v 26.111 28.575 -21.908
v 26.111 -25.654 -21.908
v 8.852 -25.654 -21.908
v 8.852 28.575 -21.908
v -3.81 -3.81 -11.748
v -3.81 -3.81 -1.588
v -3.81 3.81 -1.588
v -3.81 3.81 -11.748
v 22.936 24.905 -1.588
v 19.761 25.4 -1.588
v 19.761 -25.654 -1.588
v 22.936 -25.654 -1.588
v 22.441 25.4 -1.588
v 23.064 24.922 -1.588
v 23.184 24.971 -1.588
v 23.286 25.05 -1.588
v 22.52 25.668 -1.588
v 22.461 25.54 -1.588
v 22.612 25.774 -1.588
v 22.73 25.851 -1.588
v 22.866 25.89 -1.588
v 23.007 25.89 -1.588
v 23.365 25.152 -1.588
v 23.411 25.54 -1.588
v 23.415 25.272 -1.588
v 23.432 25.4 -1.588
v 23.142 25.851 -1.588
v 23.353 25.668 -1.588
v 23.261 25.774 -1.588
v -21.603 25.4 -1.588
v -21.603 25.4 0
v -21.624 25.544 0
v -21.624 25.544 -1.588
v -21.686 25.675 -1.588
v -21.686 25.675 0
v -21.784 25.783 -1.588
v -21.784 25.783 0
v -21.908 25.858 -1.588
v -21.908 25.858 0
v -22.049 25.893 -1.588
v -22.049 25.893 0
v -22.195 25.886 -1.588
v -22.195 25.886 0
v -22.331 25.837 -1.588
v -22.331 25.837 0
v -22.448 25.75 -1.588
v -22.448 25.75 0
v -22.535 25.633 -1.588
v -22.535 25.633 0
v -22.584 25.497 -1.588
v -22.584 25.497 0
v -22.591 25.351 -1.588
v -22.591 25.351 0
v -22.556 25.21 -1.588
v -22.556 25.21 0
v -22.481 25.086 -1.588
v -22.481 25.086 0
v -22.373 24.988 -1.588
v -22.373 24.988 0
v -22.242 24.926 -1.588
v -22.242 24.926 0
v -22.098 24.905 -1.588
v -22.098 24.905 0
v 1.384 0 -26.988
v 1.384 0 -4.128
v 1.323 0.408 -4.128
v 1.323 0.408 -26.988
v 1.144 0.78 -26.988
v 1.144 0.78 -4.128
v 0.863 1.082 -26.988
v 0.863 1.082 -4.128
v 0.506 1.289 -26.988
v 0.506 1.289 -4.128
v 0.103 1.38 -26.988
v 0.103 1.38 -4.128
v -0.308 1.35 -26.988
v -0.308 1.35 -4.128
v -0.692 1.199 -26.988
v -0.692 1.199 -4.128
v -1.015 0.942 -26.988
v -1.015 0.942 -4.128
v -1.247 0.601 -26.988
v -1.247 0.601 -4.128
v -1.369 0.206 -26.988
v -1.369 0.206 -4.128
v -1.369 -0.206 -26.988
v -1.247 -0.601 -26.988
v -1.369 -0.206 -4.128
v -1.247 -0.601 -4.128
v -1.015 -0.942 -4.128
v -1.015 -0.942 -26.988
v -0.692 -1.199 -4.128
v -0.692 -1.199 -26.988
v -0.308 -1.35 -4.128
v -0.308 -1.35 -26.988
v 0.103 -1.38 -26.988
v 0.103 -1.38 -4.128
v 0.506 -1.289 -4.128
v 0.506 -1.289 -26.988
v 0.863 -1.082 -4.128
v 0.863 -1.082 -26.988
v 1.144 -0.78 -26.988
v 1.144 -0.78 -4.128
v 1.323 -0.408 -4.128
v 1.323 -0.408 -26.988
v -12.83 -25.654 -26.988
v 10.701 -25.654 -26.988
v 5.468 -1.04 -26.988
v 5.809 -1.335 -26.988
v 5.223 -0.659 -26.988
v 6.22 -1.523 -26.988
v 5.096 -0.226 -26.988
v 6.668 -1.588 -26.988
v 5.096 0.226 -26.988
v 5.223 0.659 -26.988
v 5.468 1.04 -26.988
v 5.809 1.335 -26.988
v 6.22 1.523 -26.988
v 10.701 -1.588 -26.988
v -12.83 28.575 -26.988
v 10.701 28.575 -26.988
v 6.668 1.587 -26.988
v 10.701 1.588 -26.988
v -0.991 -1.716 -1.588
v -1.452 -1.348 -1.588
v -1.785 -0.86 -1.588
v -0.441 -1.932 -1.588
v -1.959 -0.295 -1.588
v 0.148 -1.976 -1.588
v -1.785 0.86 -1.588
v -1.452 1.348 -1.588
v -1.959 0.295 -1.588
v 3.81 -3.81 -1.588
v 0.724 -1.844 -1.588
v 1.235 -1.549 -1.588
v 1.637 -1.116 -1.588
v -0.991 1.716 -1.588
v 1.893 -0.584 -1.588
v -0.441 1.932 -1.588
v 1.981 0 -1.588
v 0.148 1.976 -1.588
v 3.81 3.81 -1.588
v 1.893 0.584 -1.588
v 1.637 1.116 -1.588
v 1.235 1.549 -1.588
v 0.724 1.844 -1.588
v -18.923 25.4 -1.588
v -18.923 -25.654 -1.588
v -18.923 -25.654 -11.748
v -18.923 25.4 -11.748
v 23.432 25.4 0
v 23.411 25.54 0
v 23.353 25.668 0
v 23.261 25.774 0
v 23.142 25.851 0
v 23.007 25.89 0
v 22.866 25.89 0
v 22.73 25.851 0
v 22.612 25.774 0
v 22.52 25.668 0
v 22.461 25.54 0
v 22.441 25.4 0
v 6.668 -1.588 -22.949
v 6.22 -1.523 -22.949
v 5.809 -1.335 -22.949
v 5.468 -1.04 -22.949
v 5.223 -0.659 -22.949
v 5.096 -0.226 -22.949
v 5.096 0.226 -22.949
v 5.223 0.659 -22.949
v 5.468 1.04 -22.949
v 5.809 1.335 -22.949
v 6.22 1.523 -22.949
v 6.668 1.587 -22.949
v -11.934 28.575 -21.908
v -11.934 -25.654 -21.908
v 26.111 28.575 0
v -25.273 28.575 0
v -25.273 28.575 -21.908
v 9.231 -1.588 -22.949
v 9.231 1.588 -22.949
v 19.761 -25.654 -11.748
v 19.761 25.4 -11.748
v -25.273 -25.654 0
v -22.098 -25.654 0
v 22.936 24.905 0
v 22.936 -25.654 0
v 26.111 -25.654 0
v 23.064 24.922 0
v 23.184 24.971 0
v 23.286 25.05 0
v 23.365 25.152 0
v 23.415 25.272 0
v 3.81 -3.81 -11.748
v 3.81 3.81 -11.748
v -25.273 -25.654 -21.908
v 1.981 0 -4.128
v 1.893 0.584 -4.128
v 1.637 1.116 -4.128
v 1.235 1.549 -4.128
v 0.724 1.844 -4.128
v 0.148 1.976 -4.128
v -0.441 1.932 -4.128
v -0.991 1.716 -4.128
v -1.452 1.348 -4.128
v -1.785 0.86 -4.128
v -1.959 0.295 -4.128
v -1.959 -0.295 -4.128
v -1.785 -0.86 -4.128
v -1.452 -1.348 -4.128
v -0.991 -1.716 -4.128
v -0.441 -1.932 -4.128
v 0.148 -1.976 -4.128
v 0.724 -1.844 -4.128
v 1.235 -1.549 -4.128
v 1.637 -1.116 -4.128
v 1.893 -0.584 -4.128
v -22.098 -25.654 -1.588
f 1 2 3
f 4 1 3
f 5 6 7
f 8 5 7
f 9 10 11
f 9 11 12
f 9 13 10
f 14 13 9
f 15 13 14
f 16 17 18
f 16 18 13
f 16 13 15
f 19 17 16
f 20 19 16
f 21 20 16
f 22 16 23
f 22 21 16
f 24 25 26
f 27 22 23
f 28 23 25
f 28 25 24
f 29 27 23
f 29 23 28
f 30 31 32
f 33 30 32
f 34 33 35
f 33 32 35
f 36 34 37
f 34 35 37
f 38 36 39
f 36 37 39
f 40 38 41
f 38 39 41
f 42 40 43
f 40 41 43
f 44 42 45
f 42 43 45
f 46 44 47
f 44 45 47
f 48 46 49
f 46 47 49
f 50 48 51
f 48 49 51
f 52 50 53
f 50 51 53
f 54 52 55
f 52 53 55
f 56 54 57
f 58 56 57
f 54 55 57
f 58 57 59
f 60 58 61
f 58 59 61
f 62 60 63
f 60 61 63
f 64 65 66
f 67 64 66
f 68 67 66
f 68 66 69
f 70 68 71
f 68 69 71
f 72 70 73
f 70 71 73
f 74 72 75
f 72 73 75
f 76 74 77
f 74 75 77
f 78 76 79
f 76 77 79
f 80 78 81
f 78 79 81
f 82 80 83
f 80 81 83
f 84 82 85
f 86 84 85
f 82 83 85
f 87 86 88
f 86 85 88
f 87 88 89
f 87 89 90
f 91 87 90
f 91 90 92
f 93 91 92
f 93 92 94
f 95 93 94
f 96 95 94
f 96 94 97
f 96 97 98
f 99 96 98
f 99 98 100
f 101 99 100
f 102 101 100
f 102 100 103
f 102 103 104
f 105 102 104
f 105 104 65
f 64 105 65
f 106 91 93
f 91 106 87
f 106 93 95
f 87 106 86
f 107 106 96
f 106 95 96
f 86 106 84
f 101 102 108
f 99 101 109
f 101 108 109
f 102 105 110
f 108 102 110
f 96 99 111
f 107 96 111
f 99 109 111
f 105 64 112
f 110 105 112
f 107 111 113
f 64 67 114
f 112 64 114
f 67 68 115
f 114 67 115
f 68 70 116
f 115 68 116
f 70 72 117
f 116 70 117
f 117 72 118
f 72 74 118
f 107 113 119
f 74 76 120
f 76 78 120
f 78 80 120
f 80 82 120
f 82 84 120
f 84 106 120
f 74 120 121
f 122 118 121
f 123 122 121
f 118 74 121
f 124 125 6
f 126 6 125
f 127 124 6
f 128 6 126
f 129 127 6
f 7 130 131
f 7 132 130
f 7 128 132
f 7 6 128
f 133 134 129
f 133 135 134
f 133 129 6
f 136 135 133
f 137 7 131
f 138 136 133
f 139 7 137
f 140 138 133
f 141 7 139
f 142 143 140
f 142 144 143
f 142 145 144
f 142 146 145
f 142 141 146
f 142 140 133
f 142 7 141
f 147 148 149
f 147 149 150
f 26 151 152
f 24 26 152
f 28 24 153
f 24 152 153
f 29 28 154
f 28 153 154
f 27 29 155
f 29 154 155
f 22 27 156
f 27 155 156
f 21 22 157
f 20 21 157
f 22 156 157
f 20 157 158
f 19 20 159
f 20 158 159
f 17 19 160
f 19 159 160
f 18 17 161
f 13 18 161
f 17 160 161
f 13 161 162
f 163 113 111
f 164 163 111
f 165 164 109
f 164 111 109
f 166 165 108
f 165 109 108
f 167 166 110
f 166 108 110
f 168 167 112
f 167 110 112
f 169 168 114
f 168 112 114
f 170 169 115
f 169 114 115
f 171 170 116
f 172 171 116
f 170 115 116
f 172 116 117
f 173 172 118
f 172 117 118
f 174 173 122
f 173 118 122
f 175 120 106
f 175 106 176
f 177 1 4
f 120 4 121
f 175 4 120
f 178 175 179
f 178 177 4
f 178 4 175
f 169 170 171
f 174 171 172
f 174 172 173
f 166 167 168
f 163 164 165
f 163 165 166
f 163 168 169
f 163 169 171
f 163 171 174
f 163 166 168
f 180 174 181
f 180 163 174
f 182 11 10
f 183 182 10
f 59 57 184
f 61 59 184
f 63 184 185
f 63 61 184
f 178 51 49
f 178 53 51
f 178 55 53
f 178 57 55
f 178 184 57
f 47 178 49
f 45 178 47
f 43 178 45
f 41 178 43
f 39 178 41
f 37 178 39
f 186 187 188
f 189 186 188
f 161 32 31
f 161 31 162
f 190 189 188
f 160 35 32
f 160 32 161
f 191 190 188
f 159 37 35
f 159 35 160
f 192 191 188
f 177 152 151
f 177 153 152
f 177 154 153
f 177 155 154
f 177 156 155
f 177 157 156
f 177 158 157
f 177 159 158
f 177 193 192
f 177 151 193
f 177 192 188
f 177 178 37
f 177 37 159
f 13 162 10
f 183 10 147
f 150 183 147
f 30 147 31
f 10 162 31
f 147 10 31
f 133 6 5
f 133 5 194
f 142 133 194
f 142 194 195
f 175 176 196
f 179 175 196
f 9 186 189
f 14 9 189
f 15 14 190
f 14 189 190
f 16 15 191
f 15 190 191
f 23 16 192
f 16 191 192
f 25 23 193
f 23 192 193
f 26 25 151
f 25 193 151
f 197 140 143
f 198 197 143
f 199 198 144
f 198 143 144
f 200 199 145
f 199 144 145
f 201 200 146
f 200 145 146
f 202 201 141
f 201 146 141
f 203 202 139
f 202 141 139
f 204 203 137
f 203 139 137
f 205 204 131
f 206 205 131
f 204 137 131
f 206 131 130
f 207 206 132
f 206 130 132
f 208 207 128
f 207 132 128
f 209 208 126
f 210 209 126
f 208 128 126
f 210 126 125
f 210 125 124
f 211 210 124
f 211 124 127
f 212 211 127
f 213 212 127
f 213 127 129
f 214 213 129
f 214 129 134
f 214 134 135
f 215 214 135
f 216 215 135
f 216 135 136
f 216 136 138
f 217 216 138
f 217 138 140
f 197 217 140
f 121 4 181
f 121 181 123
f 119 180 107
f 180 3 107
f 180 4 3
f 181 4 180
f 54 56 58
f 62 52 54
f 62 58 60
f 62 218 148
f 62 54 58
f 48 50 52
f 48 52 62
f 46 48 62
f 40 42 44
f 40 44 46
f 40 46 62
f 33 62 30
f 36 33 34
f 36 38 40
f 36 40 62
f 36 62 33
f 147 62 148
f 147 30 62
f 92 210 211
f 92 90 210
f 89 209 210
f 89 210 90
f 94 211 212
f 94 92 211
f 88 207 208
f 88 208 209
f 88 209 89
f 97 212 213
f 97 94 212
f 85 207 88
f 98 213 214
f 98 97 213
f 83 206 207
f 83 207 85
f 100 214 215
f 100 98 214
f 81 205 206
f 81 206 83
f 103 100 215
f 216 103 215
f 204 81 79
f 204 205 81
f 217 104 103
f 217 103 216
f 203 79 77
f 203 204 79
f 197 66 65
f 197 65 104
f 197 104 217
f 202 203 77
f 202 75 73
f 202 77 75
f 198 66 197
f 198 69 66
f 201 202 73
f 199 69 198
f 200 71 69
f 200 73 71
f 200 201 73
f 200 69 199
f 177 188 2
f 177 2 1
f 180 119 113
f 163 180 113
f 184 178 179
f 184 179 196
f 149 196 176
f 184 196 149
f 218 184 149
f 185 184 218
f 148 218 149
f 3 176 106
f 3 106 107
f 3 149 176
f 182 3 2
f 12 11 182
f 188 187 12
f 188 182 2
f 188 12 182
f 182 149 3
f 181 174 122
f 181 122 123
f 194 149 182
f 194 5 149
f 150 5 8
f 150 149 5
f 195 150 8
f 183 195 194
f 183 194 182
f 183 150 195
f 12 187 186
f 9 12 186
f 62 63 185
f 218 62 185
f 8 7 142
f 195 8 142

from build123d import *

# Parameters (mm, degrees)
F0_W     = 38.6842
F0_H     = 51.054
F0_W_2   = 7.62
F0_H_2   = 7.62
F0_R     = 1.9812
F0_R_2   = 1.3843
F1_DEPTH = 26.9875
F2_DEPTH = 1.5875
F3_DEPTH = 11.7475
F4_DEPTH = 4.1275
F6_DEPTH = 54.23
F8_DEPTH = 4.0386


with BuildPart() as f1:
    # F0 (on Top) → F1 (new body)
    with BuildSketch(Plane.XY):
        with Locations((0.4191, -0.127)):
            Rectangle(F0_W, F0_H)
        Rectangle(F0_W_2, F0_H_2, mode=Mode.SUBTRACT)
        with BuildLine():
            Line((26.1112, 28.575), (-25.273, 28.575))
            Line((-25.273, 28.575), (-25.273, -25.654))
            Line((-25.273, -25.654), (-22.098, -25.654))
            Line((-22.098, -25.654), (-22.098, 24.9047))
            ThreePointArc((-22.098, 24.9047), (-22.4482299887, 25.7502299887), (-21.6027, 25.4))
            Line((-21.6027, 25.4), (-18.923, 25.4))
            Line((-18.923, 25.4), (19.7612, 25.4))
            Line((19.7612, 25.4), (22.4409, 25.4))
            ThreePointArc((22.4409, 25.4), (22.9362, 25.8953), (23.4315, 25.4))
            ThreePointArc((23.4315, 25.4), (23.2864299887, 25.0497700113), (22.9362, 24.9047))
            Line((22.9362, 24.9047), (22.9362, -25.654))
            Line((22.9362, -25.654), (26.1112, -25.654))
            Line((26.1112, -25.654), (26.1112, 28.575))
        make_face()
        with BuildLine():
            Line((-22.098, 24.9047), (-22.098, -25.654))
            Line((-22.098, -25.654), (-18.923, -25.654))
            Line((-18.923, -25.654), (-18.923, 25.4))
            Line((-18.923, 25.4), (-21.6027, 25.4))
            ThreePointArc((-21.6027, 25.4), (-21.7477700113, 25.0497700113), (-22.098, 24.9047))
        make_face()
        with BuildLine():
            Line((19.7612, -25.654), (22.9362, -25.654))
            Line((22.9362, -25.654), (22.9362, 24.9047))
            ThreePointArc((22.9362, 24.9047), (22.5859700113, 25.0497700113), (22.4409, 25.4))
            Line((22.4409, 25.4), (19.7612, 25.4))
            Line((19.7612, 25.4), (19.7612, -25.654))
        make_face()
        Rectangle(F0_W_2, F0_H_2)
        Circle(F0_R, mode=Mode.SUBTRACT)
        Circle(F0_R)
        Circle(F0_R_2, mode=Mode.SUBTRACT)
        with BuildLine():
            ThreePointArc((-21.6027, 25.4), (-22.4482299887, 25.7502299887), (-22.098, 24.9047))
            Line((-22.098, 24.9047), (-22.098, 25.4))
            Line((-22.098, 25.4), (-21.6027, 25.4))
        make_face()
        with BuildLine():
            Line((22.9362, 25.4), (22.9362, 24.9047))
            ThreePointArc((22.9362, 24.9047), (23.2864299887, 25.0497700113), (23.4315, 25.4))
            ThreePointArc((23.4315, 25.4), (22.9362, 25.8953), (22.4409, 25.4))
            Line((22.4409, 25.4), (22.9362, 25.4))
        make_face()
        with BuildLine():
            Line((-22.098, 25.4), (-22.098, 24.9047))
            ThreePointArc((-22.098, 24.9047), (-21.7477700113, 25.0497700113), (-21.6027, 25.4))
            Line((-21.6027, 25.4), (-22.098, 25.4))
        make_face()
        with BuildLine():
            ThreePointArc((22.4409, 25.4), (22.5859700113, 25.0497700113), (22.9362, 24.9047))
            Line((22.9362, 24.9047), (22.9362, 25.4))
            Line((22.9362, 25.4), (22.4409, 25.4))
        make_face()
    extrude(amount=-F1_DEPTH)

    # F0 (on Top) → F2 (cut)
    with BuildSketch(Plane.XY):
        with Locations((0.4191, -0.127)):
            Rectangle(F0_W, F0_H)
        Rectangle(F0_W_2, F0_H_2, mode=Mode.SUBTRACT)
        with BuildLine():
            Line((-22.098, 24.9047), (-22.098, -25.654))
            Line((-22.098, -25.654), (-18.923, -25.654))
            Line((-18.923, -25.654), (-18.923, 25.4))
            Line((-18.923, 25.4), (-21.6027, 25.4))
            ThreePointArc((-21.6027, 25.4), (-21.7477700113, 25.0497700113), (-22.098, 24.9047))
        make_face()
        with BuildLine():
            Line((19.7612, -25.654), (22.9362, -25.654))
            Line((22.9362, -25.654), (22.9362, 24.9047))
            ThreePointArc((22.9362, 24.9047), (22.5859700113, 25.0497700113), (22.4409, 25.4))
            Line((22.4409, 25.4), (19.7612, 25.4))
            Line((19.7612, 25.4), (19.7612, -25.654))
        make_face()
        Rectangle(F0_W_2, F0_H_2)
        Circle(F0_R, mode=Mode.SUBTRACT)
        Circle(F0_R)
        Circle(F0_R_2, mode=Mode.SUBTRACT)
        with BuildLine():
            Line((22.9362, 25.4), (22.9362, 24.9047))
            ThreePointArc((22.9362, 24.9047), (23.2864299887, 25.0497700113), (23.4315, 25.4))
            ThreePointArc((23.4315, 25.4), (22.9362, 25.8953), (22.4409, 25.4))
            Line((22.4409, 25.4), (22.9362, 25.4))
        make_face()
        with BuildLine():
            ThreePointArc((-21.6027, 25.4), (-22.4482299887, 25.7502299887), (-22.098, 24.9047))
            Line((-22.098, 24.9047), (-22.098, 25.4))
            Line((-22.098, 25.4), (-21.6027, 25.4))
        make_face()
        with BuildLine():
            ThreePointArc((22.4409, 25.4), (22.5859700113, 25.0497700113), (22.9362, 24.9047))
            Line((22.9362, 24.9047), (22.9362, 25.4))
            Line((22.9362, 25.4), (22.4409, 25.4))
        make_face()
        with BuildLine():
            Line((-22.098, 25.4), (-22.098, 24.9047))
            ThreePointArc((-22.098, 24.9047), (-21.7477700113, 25.0497700113), (-21.6027, 25.4))
            Line((-21.6027, 25.4), (-22.098, 25.4))
        make_face()
    extrude(amount=-F2_DEPTH, mode=Mode.SUBTRACT)

    # F0 (on Top) → F3 (cut)
    with BuildSketch(Plane.XY):
        with Locations((0.4191, -0.127)):
            Rectangle(F0_W, F0_H)
        Rectangle(F0_W_2, F0_H_2, mode=Mode.SUBTRACT)
    extrude(amount=-F3_DEPTH, mode=Mode.SUBTRACT)

    # F0 (on Top) → F4 (cut)
    with BuildSketch(Plane.XY):
        Circle(F0_R)
        Circle(F0_R_2, mode=Mode.SUBTRACT)
    extrude(amount=-F4_DEPTH, mode=Mode.SUBTRACT)

    # F5 (on face) → F6 (cut, through all)
    with BuildSketch(Plane.XZ.offset(25.654)):
        Polygon((-11.933798938, -21.9075), (-25.273, -21.9075), (-25.273, -26.9875), (-12.82954, -26.9875), align=None)
        Polygon((26.1112, -26.9875), (26.1112, -21.9075), (8.8520512099, -21.9075), (10.70102, -26.9875), align=None)
    extrude(amount=-F6_DEPTH, mode=Mode.SUBTRACT)

    # F7 (on face) → F8 (cut)
    with BuildSketch(Plane(origin=(0, 0, -26.9875), x_dir=(1, 0, 0), z_dir=(0, 0, -1))):
        with BuildLine():
            ThreePointArc((6.6675, 1.5875), (7.7900320151, 1.1225320151), (8.255, 0))
            ThreePointArc((8.255, 0), (7.7900320151, -1.1225320151), (6.6675, -1.5875))
            Line((6.6675, -1.5875), (10.70102, -1.5875))
            Line((10.70102, -1.5875), (10.70102, 1.5875))
            Line((10.70102, 1.5875), (6.6675, 1.5875))
        make_face()
        with BuildLine():
            ThreePointArc((6.6675, -1.5875), (7.7900320151, -1.1225320151), (8.255, 0))
            ThreePointArc((8.255, 0), (7.7900320151, 1.1225320151), (6.6675, 1.5875))
            ThreePointArc((6.6675, 1.5875), (5.08, 0), (6.6675, -1.5875))
        make_face()
    extrude(amount=-F8_DEPTH, mode=Mode.SUBTRACT)


solid = f1.part
